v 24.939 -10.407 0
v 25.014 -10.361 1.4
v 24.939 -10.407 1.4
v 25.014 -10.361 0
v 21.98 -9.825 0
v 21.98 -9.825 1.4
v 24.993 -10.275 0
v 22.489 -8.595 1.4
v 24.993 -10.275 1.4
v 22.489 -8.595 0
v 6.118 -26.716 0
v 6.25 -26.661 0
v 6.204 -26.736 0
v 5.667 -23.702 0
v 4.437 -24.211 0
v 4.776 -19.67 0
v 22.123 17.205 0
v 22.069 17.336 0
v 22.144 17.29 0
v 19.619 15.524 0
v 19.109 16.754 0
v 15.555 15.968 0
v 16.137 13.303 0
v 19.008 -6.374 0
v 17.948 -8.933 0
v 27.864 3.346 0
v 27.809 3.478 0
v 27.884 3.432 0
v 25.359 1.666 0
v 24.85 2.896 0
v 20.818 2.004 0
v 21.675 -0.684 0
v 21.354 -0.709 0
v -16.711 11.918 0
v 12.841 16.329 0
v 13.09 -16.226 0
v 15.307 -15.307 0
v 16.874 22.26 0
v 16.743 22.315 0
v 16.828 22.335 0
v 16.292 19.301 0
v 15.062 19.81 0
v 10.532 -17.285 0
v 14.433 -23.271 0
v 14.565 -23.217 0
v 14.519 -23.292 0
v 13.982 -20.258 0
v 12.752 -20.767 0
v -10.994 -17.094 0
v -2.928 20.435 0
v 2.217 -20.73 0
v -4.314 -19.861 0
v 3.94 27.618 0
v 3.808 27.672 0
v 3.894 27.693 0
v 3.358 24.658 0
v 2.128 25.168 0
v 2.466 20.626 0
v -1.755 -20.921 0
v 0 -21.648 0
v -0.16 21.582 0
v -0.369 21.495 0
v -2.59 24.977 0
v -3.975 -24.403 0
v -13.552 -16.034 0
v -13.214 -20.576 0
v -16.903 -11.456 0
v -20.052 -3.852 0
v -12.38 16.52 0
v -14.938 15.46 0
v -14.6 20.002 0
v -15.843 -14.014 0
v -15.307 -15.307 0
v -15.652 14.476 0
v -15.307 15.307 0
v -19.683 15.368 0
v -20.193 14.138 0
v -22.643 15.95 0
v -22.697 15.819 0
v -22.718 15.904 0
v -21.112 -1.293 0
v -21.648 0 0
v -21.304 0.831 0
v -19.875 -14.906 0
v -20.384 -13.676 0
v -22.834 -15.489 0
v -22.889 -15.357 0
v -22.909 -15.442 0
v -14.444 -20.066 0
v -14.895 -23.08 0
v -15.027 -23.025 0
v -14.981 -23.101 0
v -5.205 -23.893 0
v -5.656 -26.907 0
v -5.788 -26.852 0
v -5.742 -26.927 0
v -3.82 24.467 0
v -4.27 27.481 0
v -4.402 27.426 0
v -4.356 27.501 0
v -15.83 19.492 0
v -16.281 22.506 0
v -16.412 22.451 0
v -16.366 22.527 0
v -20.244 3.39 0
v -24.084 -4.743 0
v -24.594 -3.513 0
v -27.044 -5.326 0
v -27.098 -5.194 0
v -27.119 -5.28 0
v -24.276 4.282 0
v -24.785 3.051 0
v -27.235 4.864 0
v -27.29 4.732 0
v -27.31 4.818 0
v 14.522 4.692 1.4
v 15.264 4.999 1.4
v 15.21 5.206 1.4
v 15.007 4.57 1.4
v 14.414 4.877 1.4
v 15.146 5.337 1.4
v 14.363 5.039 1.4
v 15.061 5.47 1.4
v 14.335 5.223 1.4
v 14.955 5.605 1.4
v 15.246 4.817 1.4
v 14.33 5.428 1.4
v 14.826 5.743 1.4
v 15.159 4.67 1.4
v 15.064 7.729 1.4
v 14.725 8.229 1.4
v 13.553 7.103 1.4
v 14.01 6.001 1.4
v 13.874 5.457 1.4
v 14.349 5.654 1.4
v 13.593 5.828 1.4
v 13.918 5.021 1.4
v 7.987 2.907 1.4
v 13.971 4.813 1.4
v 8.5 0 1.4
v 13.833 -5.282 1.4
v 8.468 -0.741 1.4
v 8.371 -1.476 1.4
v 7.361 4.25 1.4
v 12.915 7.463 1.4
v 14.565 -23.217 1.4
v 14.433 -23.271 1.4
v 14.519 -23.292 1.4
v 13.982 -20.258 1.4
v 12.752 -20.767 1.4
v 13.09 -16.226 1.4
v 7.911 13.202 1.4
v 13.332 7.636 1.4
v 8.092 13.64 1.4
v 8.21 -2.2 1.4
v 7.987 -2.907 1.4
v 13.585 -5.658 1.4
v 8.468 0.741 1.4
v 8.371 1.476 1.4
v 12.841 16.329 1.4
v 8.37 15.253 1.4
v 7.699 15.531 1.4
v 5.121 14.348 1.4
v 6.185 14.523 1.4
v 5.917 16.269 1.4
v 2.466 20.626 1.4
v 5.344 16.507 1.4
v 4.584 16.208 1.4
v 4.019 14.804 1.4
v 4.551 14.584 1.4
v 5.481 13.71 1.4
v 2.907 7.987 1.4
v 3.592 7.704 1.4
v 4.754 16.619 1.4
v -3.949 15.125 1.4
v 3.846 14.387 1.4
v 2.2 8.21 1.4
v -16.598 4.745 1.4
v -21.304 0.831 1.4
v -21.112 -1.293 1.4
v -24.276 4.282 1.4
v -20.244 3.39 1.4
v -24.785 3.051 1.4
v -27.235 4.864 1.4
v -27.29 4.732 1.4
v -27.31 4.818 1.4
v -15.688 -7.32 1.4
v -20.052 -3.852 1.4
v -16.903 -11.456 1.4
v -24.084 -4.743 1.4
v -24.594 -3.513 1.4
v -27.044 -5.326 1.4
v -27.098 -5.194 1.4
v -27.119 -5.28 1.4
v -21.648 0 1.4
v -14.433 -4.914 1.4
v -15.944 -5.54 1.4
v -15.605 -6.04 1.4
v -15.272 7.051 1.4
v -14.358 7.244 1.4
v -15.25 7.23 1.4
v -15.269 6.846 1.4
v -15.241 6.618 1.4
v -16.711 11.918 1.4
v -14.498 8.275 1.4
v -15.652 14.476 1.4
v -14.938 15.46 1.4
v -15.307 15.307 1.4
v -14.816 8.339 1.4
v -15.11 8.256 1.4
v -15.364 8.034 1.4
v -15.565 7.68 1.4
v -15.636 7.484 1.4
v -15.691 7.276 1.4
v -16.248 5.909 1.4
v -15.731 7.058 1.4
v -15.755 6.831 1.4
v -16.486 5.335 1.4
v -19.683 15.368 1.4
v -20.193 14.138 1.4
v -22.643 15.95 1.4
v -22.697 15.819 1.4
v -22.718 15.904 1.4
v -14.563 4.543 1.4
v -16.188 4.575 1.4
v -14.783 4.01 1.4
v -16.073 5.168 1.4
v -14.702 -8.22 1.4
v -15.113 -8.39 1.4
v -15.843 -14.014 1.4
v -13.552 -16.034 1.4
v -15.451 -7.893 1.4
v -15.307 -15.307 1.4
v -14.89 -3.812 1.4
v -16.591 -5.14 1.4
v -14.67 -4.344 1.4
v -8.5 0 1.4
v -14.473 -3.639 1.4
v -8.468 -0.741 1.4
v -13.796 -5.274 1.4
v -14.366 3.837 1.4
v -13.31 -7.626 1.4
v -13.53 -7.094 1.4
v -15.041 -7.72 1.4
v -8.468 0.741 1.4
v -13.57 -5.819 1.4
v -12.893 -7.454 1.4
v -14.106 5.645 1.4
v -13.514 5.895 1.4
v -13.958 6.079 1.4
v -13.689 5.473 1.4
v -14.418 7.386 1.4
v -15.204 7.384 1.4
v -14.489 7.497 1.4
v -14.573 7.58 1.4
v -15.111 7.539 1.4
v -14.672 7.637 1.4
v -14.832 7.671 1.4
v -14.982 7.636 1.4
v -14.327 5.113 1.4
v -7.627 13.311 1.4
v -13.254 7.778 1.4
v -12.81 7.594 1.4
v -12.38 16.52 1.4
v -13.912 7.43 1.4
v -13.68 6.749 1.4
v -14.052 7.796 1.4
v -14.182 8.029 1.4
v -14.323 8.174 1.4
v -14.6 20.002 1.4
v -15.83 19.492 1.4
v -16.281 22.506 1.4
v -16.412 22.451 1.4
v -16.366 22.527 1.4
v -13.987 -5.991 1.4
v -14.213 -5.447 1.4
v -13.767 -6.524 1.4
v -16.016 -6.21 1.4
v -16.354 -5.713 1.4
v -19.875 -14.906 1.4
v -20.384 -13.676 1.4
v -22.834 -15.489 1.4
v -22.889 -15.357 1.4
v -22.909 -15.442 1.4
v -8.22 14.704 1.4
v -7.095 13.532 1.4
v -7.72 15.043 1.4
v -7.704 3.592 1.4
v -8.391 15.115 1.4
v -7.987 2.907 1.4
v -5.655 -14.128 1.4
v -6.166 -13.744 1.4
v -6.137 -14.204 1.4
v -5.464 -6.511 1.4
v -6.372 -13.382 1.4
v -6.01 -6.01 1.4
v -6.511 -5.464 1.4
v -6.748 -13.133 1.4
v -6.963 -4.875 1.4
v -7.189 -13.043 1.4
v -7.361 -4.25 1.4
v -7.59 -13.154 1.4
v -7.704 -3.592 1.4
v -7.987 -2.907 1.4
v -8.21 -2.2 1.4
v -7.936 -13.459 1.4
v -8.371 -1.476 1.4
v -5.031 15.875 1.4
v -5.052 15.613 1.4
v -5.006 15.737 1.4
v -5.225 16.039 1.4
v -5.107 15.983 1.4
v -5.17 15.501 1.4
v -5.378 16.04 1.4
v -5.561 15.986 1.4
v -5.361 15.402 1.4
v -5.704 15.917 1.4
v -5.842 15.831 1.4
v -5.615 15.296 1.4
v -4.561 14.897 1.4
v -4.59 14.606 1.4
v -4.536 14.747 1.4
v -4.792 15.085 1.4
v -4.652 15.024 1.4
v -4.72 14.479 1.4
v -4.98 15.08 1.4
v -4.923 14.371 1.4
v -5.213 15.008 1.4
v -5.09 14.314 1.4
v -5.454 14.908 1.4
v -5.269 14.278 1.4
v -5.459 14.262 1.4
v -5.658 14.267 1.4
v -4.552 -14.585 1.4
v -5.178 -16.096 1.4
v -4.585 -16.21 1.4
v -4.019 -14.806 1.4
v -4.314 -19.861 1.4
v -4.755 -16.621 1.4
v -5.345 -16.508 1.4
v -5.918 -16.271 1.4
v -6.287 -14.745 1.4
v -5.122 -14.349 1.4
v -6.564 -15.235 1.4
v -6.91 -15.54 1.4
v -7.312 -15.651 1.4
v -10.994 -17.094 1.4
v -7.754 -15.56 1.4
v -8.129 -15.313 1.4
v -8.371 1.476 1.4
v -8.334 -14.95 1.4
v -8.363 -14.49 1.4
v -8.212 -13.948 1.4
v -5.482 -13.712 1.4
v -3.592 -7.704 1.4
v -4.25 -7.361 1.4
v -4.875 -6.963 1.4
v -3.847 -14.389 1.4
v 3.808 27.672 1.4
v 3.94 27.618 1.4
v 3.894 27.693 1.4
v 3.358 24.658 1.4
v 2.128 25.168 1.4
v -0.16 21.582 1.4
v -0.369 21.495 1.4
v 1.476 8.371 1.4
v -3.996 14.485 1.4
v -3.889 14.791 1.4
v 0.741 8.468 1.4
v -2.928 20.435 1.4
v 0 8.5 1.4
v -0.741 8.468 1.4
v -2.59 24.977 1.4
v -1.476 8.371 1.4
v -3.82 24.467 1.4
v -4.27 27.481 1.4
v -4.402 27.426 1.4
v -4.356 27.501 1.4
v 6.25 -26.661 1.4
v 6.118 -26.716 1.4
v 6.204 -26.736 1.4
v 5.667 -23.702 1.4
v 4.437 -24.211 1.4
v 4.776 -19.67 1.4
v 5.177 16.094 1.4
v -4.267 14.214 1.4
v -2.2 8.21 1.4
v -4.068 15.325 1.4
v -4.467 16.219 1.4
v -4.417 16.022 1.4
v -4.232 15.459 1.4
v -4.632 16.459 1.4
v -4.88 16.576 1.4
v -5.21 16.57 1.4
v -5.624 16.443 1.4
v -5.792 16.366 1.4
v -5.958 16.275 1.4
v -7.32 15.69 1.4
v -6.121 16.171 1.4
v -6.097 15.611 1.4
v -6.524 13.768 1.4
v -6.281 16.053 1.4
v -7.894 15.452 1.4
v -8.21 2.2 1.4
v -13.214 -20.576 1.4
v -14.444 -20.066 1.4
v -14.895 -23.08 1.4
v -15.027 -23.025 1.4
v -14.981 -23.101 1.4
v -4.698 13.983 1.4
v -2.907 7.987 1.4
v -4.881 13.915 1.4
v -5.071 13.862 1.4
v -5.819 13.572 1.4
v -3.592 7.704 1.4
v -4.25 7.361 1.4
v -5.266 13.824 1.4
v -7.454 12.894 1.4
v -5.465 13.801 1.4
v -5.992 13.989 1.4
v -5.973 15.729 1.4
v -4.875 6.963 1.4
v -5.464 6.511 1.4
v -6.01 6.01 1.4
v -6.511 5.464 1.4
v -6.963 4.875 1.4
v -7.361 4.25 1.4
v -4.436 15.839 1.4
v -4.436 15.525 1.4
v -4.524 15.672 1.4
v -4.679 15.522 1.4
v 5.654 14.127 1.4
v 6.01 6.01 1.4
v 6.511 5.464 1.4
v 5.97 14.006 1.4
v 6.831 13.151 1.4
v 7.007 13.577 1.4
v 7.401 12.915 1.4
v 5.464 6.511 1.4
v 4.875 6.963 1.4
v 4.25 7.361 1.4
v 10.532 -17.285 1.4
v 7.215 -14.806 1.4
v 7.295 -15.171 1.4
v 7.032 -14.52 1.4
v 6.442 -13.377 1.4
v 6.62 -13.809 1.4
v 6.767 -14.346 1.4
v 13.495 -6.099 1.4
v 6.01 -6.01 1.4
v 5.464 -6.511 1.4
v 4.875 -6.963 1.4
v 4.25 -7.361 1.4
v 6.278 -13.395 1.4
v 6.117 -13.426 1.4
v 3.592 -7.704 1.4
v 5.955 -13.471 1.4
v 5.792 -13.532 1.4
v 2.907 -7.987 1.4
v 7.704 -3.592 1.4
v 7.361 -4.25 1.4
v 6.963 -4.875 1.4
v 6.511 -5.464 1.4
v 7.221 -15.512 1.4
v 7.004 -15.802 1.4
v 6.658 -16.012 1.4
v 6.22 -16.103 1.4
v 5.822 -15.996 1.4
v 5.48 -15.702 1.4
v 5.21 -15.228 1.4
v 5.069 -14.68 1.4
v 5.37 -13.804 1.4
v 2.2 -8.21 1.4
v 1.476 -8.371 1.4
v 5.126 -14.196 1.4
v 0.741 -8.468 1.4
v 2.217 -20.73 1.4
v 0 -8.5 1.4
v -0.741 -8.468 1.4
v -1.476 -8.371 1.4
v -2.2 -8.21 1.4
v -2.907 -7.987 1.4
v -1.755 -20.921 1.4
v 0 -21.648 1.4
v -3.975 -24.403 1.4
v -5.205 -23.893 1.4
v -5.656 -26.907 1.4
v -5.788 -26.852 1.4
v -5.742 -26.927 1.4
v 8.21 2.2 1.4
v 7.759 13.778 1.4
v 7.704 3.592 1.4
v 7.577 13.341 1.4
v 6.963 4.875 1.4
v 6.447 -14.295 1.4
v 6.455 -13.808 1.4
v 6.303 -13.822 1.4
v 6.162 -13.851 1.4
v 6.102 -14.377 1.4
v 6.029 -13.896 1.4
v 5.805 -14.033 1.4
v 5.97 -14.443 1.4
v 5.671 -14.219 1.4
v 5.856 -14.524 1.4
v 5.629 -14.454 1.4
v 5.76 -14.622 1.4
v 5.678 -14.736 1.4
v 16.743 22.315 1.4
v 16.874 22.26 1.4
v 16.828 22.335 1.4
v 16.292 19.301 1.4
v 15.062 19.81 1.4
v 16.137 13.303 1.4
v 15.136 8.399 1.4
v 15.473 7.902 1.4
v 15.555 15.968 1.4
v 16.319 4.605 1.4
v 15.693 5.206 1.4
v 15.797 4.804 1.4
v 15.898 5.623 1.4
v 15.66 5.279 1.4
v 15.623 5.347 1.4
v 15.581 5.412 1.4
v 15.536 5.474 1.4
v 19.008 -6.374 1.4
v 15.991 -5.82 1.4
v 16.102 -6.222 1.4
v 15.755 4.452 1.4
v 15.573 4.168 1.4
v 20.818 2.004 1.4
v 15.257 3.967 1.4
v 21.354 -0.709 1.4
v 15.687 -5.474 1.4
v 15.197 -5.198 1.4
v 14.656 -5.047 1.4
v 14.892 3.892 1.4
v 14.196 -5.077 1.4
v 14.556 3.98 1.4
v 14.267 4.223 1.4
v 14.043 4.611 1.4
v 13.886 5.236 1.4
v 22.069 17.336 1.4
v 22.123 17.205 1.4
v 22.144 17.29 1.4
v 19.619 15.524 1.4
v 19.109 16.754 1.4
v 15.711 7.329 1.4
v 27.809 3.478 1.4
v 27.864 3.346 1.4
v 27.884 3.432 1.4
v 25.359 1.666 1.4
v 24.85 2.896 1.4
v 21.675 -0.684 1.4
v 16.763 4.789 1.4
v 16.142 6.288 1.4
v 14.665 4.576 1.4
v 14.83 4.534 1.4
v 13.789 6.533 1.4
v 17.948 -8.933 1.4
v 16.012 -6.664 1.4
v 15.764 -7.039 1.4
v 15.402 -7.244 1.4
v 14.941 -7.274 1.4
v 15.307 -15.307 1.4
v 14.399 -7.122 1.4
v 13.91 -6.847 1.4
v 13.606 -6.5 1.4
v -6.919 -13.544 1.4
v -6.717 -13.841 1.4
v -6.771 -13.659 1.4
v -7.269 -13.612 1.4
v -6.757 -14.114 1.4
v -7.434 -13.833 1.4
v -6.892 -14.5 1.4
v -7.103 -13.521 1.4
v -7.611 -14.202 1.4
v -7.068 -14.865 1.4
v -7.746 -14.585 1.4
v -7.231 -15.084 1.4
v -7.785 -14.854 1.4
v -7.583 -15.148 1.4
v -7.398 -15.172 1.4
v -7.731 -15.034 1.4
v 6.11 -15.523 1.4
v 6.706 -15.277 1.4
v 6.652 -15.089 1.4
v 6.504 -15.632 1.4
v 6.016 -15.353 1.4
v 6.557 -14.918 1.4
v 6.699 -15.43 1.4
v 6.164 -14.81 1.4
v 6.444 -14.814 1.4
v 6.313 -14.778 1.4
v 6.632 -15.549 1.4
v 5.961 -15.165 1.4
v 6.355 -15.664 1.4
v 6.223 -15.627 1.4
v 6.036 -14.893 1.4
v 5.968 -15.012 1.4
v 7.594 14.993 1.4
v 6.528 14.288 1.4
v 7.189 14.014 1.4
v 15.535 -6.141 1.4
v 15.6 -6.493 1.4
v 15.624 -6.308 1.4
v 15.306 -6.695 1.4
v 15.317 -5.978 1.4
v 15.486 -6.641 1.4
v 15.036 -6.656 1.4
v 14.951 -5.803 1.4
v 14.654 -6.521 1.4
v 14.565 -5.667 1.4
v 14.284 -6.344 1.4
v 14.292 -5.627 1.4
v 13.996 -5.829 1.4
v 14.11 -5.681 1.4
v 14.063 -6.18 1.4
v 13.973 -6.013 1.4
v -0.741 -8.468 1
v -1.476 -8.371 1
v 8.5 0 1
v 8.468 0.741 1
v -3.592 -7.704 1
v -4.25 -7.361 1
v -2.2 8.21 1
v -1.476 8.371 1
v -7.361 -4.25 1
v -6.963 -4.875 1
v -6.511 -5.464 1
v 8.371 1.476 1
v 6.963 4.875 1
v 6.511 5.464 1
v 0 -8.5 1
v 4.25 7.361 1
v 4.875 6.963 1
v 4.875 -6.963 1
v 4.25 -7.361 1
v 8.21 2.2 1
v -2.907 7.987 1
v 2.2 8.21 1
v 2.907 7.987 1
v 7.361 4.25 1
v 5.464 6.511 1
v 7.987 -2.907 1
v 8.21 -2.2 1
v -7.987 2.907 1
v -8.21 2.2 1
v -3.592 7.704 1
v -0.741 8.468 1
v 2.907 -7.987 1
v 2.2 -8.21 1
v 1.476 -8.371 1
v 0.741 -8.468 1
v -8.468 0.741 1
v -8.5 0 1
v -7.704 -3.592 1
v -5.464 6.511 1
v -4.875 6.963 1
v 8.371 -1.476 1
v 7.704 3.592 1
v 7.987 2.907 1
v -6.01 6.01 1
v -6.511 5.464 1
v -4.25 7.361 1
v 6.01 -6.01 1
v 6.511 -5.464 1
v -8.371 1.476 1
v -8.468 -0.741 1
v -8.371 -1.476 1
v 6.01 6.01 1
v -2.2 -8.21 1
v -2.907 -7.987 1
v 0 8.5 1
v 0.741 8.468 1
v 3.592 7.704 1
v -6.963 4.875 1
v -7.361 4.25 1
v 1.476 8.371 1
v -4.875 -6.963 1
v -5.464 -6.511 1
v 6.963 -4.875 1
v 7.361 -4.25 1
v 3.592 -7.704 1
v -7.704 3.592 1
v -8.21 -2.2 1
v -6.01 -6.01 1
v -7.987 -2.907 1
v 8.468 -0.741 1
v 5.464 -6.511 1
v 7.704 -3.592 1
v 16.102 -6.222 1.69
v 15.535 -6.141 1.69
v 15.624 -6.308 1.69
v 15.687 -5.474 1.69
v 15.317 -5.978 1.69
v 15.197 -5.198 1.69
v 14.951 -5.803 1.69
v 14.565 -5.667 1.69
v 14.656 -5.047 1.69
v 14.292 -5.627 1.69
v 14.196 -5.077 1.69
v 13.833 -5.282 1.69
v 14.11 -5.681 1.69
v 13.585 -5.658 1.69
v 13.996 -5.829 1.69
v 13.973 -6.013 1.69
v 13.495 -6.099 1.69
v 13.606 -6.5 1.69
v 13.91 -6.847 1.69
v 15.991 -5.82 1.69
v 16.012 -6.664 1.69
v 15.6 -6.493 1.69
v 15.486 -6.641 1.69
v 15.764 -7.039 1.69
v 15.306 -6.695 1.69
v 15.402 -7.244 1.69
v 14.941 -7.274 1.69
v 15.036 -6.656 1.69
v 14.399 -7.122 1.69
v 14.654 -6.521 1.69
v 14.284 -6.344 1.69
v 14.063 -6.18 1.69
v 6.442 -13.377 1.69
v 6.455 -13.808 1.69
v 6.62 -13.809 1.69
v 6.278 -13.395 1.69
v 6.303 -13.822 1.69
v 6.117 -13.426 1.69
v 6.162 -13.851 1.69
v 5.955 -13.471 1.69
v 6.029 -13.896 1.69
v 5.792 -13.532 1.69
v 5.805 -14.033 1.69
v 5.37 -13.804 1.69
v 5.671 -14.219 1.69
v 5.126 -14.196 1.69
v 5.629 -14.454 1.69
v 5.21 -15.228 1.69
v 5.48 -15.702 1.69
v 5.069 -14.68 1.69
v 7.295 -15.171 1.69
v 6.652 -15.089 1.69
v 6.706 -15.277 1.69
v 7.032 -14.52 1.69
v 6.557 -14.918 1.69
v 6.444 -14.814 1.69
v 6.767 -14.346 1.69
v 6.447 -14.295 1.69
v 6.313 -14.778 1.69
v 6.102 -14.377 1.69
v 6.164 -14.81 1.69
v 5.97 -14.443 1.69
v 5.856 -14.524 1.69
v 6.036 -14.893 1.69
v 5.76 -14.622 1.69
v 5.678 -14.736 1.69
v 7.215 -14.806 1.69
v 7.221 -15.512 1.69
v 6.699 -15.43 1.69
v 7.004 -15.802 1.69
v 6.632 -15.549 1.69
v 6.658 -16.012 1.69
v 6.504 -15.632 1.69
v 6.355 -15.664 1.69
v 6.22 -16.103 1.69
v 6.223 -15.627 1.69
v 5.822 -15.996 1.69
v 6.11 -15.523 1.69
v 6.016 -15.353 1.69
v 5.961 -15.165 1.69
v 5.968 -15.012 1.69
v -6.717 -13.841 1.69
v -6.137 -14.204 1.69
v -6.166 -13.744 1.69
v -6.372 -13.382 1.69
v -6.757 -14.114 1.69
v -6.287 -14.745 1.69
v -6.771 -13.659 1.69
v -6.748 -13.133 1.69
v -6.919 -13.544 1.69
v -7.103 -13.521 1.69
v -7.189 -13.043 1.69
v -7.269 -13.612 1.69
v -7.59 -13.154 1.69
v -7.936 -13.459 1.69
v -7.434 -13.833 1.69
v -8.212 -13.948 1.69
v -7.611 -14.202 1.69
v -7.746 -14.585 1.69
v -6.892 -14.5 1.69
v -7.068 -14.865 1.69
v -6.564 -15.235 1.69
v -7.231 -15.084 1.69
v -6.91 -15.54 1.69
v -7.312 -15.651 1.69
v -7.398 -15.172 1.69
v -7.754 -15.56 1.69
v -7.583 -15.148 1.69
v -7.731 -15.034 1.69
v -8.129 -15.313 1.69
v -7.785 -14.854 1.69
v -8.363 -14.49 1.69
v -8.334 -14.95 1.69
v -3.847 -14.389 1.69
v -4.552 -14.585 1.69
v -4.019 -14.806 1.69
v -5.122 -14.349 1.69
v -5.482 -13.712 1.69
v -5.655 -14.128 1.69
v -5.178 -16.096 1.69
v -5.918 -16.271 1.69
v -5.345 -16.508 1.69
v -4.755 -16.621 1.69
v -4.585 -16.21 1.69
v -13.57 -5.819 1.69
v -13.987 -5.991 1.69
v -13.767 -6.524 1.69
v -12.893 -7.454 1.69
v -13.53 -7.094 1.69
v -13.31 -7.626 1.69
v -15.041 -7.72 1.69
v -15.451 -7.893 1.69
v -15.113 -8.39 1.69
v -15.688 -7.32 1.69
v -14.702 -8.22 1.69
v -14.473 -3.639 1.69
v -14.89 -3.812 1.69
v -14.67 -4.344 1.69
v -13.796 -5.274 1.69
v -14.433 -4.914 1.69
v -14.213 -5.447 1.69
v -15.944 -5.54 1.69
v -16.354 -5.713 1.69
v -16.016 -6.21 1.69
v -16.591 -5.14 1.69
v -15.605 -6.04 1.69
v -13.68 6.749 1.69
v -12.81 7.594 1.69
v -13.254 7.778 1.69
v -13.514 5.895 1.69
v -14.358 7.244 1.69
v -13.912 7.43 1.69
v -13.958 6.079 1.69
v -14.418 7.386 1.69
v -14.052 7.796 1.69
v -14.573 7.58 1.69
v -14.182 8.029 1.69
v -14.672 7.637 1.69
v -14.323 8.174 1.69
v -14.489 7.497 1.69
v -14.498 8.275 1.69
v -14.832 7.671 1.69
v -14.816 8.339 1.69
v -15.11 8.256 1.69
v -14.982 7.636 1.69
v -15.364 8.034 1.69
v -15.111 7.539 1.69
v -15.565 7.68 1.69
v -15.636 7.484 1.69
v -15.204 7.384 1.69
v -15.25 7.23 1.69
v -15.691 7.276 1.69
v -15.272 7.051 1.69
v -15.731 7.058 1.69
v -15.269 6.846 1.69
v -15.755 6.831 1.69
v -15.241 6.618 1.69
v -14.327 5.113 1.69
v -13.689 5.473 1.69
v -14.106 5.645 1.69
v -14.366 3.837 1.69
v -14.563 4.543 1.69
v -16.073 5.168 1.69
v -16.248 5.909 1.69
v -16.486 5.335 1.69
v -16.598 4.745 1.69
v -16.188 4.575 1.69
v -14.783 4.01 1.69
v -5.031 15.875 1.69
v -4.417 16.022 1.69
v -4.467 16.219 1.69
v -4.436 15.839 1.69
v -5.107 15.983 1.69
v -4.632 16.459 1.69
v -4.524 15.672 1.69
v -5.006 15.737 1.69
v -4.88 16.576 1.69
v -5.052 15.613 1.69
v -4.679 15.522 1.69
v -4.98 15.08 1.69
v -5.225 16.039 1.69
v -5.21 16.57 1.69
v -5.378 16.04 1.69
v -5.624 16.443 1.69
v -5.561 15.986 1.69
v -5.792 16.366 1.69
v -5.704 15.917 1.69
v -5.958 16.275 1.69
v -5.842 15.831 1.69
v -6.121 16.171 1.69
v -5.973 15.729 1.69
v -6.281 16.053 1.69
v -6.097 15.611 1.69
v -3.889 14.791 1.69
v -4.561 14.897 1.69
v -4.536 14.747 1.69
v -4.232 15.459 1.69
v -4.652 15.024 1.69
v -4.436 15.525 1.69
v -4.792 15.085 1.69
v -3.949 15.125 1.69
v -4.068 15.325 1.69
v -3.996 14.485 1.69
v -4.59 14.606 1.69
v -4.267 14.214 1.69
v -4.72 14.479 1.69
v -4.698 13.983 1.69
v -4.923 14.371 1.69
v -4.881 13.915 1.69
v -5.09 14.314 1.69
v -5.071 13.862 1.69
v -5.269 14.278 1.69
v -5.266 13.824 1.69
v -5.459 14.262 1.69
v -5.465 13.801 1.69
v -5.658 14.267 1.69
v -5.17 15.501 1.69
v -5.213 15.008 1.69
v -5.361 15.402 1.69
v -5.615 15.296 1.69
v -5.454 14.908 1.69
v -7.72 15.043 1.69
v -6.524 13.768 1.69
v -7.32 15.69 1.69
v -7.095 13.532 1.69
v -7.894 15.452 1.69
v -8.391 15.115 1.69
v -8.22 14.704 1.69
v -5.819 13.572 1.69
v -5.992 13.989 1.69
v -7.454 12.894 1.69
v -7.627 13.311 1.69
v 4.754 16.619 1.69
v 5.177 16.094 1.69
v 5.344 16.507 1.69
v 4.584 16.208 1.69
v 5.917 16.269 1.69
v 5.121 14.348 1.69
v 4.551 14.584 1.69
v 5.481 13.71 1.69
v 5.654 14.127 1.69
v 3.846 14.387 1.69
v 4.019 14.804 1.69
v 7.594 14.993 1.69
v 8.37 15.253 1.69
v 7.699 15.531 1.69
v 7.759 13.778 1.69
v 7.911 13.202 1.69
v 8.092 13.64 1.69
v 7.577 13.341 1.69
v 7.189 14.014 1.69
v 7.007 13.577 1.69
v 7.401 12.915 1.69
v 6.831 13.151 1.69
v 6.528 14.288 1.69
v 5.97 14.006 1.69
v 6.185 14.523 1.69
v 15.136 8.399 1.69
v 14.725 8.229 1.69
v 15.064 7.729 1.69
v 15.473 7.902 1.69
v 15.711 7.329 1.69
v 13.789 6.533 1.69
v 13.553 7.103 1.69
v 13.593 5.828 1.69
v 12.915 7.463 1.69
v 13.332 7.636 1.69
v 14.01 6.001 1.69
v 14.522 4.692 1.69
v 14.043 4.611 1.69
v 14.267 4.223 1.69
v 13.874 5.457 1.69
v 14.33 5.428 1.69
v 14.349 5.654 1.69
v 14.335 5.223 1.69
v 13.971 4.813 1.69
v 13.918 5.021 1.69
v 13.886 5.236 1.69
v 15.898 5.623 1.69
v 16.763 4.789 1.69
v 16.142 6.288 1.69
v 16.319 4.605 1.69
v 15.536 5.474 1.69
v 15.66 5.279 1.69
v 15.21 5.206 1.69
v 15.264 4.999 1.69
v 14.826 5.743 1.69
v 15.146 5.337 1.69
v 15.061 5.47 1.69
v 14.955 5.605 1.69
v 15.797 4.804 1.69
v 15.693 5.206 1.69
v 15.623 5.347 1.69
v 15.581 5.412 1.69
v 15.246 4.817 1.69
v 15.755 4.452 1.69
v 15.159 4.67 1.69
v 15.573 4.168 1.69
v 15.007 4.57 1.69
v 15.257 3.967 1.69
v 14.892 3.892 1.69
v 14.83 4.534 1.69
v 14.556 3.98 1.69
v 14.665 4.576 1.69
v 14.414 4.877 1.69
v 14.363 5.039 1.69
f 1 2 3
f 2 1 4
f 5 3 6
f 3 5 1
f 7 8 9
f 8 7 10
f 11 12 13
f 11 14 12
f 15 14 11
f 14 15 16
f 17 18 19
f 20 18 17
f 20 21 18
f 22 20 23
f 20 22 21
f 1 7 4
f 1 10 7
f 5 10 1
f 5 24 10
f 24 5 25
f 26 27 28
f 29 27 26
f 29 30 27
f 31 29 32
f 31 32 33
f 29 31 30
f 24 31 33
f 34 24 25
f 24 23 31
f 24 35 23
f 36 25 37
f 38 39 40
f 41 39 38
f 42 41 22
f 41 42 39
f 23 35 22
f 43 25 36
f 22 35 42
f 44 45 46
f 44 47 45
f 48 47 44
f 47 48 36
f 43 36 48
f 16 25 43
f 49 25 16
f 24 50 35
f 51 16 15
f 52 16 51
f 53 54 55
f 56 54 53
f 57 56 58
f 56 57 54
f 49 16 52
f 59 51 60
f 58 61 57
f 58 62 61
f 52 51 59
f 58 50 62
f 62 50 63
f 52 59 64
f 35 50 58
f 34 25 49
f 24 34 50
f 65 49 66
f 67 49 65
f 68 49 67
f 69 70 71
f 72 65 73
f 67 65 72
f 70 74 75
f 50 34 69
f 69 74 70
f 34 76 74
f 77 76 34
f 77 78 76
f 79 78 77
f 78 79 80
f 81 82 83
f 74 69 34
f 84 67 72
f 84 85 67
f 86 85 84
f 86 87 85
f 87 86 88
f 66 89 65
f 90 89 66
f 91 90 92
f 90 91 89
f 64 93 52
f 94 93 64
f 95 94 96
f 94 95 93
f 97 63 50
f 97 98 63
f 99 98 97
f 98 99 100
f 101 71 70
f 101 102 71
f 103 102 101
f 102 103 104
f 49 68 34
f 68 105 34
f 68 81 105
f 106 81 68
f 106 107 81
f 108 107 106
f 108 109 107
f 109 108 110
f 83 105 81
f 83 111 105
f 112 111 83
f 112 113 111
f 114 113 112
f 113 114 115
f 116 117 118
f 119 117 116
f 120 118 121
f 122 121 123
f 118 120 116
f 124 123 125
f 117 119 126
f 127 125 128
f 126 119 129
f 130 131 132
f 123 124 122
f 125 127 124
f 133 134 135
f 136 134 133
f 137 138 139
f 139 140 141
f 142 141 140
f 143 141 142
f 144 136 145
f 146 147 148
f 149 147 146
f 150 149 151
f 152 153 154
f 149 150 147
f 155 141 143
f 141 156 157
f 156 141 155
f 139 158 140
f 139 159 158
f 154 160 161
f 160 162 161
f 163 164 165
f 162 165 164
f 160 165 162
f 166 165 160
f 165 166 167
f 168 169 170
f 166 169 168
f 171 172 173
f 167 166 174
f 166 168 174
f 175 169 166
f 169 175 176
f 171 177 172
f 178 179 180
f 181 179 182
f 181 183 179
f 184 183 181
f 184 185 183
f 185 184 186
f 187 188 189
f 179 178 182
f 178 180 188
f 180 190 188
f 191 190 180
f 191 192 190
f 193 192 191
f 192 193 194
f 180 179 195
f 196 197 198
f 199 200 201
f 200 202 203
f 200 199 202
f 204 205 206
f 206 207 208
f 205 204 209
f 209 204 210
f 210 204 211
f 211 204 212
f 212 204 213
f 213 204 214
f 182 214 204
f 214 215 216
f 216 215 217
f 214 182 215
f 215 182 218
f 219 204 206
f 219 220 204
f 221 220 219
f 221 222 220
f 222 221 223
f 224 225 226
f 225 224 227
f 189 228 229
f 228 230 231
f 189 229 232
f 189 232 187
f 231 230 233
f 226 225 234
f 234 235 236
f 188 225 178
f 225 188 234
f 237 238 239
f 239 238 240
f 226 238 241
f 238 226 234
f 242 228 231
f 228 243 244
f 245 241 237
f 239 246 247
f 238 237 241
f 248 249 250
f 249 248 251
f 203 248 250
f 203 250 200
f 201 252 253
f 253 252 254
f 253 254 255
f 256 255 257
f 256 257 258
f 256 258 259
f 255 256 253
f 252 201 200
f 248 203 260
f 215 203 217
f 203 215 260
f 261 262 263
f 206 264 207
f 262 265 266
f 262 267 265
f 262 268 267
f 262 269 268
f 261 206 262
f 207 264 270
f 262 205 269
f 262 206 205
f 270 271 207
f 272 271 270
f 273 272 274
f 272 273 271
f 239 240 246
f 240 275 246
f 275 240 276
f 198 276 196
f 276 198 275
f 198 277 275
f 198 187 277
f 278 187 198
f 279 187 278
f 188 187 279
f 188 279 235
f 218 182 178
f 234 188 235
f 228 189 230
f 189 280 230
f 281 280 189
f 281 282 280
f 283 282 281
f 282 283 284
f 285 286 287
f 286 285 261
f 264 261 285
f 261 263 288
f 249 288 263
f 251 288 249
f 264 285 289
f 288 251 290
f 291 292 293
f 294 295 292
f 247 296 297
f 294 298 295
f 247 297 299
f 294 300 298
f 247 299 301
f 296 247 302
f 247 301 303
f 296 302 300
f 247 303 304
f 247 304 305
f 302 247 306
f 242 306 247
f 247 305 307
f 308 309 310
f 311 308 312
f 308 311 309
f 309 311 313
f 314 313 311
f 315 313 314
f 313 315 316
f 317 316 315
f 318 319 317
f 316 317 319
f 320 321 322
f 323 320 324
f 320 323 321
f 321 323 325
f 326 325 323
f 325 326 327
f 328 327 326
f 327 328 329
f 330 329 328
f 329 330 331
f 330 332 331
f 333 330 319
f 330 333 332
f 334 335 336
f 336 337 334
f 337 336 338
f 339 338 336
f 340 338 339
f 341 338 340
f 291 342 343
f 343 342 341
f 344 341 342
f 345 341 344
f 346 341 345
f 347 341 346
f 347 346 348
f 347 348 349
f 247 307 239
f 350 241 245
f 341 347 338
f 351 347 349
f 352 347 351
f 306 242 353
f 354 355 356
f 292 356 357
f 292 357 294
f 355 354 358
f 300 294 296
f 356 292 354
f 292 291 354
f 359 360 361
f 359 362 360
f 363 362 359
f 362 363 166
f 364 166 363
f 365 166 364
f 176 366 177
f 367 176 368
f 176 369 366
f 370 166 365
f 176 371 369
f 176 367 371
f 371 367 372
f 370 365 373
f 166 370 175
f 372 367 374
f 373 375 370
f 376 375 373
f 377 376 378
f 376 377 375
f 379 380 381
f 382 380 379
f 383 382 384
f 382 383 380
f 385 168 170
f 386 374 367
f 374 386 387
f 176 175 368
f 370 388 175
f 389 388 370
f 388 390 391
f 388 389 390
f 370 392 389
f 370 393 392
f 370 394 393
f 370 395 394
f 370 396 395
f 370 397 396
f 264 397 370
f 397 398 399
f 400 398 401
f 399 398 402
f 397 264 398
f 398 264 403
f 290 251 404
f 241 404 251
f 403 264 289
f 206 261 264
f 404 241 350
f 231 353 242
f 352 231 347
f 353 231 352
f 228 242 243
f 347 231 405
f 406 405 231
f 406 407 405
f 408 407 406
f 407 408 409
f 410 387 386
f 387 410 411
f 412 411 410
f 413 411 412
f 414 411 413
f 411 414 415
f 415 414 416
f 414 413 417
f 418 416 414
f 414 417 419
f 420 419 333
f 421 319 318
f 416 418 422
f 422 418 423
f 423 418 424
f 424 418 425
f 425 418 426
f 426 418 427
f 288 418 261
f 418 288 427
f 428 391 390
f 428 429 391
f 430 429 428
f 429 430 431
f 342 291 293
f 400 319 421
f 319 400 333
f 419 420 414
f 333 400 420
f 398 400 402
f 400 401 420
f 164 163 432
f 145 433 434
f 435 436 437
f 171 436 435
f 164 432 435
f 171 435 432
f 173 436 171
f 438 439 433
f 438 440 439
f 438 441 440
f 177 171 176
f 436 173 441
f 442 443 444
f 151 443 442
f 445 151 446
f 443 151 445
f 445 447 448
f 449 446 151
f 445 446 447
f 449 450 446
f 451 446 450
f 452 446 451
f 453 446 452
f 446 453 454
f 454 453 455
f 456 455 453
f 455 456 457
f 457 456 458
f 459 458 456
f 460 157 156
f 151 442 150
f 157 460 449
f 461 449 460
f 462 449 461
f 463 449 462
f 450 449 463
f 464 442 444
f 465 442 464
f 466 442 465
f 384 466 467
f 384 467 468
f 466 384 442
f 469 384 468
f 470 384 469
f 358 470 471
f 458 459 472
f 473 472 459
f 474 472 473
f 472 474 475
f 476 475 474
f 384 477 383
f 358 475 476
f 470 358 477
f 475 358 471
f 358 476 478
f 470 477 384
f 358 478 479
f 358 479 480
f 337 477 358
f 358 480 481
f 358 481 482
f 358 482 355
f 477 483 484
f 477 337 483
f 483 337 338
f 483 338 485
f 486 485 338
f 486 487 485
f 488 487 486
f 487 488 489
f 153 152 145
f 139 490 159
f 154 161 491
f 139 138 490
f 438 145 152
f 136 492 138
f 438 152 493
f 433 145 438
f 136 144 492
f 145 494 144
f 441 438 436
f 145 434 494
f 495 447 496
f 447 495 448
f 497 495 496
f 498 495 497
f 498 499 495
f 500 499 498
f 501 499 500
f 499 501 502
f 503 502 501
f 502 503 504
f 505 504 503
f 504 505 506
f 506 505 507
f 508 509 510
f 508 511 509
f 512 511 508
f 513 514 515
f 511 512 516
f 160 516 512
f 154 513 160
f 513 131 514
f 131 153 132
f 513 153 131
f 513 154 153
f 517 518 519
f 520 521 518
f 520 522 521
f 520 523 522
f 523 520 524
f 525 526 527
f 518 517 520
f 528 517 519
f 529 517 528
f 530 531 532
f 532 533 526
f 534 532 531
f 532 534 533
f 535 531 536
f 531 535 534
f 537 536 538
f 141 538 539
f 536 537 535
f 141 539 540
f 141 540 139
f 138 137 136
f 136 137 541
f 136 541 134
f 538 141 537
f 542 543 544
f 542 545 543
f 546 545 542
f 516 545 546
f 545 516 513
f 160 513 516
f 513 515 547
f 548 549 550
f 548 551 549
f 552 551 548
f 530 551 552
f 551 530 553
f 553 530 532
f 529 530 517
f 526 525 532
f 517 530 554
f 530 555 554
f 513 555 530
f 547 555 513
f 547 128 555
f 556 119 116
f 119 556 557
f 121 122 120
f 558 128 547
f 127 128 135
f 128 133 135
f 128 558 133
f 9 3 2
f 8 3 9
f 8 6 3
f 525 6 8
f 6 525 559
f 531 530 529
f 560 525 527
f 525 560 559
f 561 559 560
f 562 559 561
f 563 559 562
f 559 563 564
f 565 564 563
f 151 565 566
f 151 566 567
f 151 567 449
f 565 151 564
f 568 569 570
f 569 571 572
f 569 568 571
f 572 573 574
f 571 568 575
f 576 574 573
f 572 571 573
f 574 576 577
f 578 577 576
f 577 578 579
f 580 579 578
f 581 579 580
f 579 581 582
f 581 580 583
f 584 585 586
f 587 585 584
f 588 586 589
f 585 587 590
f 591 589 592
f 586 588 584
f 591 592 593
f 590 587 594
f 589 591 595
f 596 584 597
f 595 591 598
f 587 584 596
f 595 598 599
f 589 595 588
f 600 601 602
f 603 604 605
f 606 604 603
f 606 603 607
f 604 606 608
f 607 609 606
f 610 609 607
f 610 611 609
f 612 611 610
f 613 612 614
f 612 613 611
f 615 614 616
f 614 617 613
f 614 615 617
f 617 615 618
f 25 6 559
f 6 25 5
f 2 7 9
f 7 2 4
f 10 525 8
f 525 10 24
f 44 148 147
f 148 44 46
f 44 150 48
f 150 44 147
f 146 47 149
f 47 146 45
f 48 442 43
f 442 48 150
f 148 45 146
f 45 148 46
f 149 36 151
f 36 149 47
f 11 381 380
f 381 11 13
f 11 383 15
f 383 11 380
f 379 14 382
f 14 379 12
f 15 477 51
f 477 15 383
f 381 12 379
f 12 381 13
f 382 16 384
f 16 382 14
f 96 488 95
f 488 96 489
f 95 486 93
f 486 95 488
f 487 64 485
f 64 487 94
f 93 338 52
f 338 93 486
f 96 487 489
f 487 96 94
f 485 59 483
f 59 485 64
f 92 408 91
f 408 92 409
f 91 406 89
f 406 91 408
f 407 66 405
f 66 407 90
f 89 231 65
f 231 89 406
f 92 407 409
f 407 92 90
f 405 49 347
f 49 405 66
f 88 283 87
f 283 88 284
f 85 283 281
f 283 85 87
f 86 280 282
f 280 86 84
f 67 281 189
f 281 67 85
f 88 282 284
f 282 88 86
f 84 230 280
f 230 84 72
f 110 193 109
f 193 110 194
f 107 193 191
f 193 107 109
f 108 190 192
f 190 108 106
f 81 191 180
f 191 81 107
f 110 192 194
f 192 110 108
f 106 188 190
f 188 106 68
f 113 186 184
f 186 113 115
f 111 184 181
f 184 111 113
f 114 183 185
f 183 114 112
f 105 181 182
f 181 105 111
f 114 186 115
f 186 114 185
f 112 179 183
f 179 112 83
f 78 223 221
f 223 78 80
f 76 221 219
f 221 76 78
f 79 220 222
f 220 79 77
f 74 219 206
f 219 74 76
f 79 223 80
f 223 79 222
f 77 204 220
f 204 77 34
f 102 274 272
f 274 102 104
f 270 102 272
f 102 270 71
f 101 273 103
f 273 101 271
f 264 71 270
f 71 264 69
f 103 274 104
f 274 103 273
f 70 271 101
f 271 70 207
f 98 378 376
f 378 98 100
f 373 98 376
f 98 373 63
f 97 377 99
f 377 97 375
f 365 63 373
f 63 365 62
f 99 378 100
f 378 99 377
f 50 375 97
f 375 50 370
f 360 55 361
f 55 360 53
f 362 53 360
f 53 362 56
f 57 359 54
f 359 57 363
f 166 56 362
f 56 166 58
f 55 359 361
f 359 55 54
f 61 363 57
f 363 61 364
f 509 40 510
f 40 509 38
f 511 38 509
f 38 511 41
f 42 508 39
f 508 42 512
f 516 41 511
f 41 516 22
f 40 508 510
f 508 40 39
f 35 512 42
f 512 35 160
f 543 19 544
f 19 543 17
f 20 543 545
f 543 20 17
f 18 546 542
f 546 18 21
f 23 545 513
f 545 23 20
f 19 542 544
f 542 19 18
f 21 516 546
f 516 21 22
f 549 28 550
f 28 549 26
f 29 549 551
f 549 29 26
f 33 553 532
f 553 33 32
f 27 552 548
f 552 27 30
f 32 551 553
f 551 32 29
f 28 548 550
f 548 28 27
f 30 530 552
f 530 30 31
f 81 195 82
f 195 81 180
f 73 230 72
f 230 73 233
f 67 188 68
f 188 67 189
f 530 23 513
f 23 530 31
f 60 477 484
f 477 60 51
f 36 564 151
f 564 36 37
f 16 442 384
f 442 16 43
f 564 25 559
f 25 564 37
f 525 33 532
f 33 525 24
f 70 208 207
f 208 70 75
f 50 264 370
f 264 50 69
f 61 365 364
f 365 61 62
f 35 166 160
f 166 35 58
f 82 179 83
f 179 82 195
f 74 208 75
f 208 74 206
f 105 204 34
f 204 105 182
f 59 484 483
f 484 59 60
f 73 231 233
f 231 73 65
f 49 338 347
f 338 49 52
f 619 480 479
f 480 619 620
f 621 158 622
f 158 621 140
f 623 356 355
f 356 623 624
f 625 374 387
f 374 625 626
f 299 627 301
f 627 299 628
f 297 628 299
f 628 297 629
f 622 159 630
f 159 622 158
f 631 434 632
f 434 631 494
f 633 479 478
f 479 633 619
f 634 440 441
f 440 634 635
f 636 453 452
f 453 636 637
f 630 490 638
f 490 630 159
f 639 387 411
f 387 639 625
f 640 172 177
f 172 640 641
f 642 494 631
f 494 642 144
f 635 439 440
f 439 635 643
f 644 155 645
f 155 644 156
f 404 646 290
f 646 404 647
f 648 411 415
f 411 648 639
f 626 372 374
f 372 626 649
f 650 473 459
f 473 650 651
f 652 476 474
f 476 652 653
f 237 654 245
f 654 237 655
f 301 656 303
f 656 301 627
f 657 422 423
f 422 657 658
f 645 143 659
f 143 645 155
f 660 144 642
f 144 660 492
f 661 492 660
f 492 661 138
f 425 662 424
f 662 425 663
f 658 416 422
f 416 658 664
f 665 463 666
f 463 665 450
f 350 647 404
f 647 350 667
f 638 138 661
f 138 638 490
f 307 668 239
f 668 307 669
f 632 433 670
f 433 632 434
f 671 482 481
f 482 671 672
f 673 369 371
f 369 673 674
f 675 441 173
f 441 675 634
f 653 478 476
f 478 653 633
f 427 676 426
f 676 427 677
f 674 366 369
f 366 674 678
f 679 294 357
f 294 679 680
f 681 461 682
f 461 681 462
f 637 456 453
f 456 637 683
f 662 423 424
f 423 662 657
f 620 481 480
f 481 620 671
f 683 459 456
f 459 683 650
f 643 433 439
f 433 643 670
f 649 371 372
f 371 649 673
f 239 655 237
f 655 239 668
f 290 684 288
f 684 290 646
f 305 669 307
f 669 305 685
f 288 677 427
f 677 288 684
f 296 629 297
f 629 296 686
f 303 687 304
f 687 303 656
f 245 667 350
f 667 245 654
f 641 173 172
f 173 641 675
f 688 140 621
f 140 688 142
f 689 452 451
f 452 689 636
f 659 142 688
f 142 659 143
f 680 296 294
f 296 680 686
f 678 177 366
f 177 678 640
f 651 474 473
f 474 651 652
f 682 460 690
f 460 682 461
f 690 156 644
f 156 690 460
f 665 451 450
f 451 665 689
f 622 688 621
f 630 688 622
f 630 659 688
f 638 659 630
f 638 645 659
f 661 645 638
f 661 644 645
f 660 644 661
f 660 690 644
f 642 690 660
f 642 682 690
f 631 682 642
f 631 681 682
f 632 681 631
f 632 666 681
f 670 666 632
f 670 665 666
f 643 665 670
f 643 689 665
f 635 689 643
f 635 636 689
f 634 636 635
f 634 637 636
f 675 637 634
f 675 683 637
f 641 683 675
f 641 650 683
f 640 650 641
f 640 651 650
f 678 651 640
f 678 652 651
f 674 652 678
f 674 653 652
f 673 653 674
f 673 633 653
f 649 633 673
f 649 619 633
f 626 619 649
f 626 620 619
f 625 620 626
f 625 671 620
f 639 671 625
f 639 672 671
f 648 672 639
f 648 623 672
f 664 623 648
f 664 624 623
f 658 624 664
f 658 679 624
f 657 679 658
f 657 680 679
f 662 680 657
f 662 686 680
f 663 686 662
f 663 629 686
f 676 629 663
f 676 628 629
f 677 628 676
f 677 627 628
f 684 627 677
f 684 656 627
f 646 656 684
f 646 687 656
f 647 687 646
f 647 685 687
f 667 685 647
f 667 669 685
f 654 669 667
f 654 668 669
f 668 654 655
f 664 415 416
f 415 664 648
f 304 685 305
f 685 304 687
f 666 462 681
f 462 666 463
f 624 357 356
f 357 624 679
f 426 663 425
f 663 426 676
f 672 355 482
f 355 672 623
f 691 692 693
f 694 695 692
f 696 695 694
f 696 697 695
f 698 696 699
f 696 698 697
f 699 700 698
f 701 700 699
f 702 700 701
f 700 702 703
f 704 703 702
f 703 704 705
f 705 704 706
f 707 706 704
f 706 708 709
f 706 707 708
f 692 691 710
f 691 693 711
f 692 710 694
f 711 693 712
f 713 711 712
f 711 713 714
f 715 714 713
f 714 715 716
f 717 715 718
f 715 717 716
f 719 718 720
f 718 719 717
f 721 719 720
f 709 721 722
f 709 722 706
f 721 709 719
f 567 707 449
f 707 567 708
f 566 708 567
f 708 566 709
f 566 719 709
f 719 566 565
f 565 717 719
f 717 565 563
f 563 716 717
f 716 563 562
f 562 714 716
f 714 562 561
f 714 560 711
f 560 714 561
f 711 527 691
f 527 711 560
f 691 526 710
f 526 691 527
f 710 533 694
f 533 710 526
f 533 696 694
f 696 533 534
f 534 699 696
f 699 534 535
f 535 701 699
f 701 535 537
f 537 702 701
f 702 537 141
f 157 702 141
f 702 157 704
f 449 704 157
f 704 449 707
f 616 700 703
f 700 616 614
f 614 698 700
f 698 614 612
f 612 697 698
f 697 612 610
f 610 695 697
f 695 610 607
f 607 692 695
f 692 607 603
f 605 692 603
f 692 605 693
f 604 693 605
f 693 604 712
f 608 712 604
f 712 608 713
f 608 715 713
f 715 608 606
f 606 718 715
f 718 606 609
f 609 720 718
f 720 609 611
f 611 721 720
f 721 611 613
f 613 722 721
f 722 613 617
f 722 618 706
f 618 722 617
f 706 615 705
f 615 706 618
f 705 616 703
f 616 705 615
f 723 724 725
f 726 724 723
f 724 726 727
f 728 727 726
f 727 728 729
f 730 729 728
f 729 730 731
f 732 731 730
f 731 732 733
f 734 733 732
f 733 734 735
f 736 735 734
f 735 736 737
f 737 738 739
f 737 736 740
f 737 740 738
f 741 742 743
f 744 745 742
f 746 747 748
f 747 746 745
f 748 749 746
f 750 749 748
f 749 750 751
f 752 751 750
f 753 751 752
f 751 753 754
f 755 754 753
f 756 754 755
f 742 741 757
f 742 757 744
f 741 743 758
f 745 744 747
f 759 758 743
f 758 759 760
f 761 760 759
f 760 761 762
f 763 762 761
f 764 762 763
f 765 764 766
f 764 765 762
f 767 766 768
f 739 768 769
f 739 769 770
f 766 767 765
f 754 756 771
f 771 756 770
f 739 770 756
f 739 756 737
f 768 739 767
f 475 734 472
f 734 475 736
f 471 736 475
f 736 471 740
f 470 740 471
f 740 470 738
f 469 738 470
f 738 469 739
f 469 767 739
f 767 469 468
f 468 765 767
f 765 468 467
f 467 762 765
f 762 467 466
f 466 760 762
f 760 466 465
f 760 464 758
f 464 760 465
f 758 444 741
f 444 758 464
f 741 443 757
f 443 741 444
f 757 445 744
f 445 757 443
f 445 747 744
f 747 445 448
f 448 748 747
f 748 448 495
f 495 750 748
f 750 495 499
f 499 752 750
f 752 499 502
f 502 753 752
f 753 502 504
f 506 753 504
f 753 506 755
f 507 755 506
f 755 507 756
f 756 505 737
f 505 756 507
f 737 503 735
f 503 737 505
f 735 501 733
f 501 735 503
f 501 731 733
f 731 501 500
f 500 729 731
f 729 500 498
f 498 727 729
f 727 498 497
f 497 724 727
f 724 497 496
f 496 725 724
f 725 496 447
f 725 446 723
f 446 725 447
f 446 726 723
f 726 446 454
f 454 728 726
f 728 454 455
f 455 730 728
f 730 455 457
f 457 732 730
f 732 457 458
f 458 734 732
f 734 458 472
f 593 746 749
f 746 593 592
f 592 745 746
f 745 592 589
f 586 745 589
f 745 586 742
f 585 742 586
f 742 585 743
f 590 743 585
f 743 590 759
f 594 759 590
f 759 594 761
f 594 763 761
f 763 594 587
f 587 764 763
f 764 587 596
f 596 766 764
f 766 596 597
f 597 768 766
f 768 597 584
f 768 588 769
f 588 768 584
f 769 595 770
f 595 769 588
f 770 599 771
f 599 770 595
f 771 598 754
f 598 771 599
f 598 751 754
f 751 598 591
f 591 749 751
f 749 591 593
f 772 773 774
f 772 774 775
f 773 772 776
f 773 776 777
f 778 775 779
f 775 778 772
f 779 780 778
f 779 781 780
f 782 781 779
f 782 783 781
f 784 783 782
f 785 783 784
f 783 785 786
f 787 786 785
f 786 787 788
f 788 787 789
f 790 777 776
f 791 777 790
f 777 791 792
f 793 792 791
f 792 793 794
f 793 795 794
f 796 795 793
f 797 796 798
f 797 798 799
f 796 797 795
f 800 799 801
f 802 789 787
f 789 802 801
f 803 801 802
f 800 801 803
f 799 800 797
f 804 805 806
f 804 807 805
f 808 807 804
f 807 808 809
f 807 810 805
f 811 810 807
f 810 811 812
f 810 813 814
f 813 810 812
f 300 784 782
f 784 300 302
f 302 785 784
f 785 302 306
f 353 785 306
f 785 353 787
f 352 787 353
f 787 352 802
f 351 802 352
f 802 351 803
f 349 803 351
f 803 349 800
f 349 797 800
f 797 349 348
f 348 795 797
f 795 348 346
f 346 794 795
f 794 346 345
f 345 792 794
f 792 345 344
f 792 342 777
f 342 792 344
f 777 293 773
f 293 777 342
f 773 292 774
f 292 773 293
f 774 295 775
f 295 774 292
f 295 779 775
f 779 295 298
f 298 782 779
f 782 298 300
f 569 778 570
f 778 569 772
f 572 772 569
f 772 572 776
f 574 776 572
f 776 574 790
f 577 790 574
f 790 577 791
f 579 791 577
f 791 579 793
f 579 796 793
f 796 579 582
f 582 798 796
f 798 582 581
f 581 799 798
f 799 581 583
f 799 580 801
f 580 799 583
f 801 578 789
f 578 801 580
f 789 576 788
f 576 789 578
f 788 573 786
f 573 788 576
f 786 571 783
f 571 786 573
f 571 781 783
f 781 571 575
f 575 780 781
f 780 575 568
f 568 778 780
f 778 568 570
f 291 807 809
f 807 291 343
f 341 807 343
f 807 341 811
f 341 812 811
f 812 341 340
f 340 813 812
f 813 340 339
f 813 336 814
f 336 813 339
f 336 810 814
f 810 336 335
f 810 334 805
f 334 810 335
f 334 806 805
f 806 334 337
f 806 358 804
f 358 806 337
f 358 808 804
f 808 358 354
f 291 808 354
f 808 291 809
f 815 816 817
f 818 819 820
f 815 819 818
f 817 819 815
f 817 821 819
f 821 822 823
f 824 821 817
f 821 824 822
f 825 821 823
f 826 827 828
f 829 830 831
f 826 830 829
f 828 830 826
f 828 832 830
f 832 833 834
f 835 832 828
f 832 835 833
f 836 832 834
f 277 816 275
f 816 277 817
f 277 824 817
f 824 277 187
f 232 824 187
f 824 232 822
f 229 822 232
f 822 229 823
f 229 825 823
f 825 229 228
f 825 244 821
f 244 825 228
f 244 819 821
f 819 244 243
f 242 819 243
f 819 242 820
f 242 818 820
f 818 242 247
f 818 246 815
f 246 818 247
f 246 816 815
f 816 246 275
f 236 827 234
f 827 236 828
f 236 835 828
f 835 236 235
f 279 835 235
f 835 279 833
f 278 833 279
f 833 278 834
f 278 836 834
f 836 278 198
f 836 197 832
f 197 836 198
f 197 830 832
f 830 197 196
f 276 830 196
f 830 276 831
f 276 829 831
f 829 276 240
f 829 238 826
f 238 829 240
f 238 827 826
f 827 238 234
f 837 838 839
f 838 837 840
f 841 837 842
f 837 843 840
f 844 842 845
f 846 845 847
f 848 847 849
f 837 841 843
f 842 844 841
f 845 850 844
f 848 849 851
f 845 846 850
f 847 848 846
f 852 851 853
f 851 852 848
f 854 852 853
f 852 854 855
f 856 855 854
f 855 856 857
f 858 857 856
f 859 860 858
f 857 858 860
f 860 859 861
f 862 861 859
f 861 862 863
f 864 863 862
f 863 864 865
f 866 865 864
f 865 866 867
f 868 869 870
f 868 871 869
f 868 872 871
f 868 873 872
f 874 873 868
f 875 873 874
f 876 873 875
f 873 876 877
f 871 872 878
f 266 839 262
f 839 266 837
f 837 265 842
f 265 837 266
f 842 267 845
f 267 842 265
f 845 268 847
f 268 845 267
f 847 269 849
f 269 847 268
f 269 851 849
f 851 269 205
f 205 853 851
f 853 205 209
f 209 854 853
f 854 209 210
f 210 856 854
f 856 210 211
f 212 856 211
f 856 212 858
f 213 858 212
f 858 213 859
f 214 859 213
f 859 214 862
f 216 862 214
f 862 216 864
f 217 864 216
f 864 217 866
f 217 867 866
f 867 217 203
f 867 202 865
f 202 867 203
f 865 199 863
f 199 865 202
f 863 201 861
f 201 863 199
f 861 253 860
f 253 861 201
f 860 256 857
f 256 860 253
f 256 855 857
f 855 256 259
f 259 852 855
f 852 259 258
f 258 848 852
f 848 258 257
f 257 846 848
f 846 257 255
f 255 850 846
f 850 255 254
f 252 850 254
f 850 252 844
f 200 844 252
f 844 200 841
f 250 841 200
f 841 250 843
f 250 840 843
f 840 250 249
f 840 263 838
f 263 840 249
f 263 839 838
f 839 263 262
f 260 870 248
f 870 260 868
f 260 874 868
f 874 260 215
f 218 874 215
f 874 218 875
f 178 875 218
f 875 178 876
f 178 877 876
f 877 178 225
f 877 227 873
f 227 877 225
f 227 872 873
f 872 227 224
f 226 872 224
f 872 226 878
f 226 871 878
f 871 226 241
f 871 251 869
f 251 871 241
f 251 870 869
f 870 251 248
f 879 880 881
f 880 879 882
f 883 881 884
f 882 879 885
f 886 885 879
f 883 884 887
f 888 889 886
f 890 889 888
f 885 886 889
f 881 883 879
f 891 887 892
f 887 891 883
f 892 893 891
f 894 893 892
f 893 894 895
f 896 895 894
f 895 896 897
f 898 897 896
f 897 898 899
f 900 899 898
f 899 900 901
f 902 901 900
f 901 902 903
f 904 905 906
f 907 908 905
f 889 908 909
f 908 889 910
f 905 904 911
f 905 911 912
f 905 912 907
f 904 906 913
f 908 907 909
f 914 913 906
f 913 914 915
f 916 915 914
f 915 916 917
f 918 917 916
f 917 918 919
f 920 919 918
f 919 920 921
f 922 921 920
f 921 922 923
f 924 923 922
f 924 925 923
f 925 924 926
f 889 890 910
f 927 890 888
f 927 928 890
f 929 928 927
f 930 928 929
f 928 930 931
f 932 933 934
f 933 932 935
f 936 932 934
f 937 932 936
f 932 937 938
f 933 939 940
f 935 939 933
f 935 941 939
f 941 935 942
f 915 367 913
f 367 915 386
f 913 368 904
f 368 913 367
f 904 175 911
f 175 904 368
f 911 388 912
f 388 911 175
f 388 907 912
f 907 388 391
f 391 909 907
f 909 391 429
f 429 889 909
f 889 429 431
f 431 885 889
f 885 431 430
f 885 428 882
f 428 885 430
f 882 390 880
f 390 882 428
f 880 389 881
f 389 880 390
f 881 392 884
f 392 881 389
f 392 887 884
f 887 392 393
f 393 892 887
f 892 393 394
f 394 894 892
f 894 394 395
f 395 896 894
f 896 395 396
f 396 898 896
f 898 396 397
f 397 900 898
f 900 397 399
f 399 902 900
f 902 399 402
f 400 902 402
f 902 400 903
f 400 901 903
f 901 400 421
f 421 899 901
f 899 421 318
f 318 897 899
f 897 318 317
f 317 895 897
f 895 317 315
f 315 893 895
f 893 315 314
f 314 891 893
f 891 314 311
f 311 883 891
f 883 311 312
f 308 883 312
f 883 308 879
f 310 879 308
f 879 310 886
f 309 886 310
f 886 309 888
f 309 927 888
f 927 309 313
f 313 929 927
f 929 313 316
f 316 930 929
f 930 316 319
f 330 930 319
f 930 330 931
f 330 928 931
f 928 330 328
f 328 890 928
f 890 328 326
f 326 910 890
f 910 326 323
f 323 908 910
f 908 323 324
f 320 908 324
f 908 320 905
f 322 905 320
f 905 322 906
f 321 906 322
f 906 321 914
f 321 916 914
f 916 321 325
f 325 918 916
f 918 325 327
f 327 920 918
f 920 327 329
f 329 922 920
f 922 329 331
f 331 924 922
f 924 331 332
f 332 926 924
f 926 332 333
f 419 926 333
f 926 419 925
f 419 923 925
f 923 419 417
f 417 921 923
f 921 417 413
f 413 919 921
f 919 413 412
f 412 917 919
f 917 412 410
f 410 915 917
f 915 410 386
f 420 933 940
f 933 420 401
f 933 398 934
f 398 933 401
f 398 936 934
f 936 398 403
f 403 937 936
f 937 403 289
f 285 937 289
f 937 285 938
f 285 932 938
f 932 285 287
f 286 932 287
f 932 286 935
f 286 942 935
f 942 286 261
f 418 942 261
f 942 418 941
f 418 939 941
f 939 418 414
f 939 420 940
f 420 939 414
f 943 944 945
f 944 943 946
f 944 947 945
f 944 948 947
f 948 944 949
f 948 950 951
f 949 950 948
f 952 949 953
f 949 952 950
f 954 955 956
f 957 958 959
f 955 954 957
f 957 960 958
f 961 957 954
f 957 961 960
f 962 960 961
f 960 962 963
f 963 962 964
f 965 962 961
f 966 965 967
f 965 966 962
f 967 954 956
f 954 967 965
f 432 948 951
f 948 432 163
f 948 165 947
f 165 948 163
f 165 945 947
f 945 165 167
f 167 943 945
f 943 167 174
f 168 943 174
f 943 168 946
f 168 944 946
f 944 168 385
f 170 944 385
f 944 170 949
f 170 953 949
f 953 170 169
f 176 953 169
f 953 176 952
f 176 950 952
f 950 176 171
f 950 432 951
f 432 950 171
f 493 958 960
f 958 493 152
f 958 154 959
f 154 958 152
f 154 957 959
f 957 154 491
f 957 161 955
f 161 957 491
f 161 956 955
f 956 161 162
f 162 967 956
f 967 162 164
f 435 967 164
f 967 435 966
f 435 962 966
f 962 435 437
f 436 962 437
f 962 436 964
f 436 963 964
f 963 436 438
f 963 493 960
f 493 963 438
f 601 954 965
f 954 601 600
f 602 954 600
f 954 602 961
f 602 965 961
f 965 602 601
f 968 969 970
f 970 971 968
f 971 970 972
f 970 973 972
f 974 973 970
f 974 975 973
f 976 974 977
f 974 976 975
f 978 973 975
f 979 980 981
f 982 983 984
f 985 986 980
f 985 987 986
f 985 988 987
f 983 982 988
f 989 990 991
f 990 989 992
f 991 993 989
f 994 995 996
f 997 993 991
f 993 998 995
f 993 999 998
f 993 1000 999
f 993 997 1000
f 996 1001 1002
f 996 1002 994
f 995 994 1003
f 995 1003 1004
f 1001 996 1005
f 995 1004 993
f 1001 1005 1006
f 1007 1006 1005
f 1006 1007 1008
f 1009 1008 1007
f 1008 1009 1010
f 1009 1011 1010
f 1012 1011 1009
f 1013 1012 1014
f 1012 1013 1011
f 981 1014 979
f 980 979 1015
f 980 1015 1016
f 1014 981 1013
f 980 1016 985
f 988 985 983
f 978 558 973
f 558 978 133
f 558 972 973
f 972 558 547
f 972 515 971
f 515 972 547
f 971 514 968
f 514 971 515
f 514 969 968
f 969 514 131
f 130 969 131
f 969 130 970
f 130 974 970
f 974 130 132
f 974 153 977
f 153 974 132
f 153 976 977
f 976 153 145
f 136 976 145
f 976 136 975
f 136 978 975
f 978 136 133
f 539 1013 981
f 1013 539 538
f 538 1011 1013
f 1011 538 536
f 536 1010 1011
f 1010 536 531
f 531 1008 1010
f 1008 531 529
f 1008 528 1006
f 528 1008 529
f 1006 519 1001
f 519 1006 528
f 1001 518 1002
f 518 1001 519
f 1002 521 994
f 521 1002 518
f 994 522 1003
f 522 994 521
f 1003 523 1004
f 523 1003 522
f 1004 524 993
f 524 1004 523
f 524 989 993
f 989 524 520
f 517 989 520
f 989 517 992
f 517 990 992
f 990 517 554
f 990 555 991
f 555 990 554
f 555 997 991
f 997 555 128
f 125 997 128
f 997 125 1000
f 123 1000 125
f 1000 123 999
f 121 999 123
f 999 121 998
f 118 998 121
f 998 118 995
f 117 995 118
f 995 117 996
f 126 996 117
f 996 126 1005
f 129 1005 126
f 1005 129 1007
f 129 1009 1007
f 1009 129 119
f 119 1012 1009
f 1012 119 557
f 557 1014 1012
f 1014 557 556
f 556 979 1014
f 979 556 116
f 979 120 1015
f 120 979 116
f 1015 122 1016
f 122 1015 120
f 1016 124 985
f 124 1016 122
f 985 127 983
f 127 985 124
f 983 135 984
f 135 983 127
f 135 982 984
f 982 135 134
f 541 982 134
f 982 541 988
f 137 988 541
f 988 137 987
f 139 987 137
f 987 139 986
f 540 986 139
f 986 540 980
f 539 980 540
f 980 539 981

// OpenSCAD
// 2-Point Discrimination Wheel — parametric n-gon, clockwise order
distances_mm       = is_undef(distances_mm) ? [0,9,10,11,12,13,14,15] : distances_mm;
outer_flat_to_flat = is_undef(outer_flat_to_flat) ? 40 : outer_flat_to_flat;
base_thickness     = is_undef(base_thickness) ? 1.4 : base_thickness;
spike_length  = is_undef(spike_length) ? 7 : spike_length;
base_d        = is_undef(base_d) ? 3 : base_d;
shank_d       = is_undef(shank_d) ? 1.4 : shank_d;
tip_d         = is_undef(tip_d) ? 0.15 : tip_d;
root_overlap  = is_undef(root_overlap) ? .7 : root_overlap;
label_size    = is_undef(label_size) ? 2.5 : label_size;
label_depth   = is_undef(label_depth) ? .3 : label_depth;
font_name     = is_undef(font_name) ? "DejaVu Sans:style=Bold" : font_name;
label_radial  = is_undef(label_radial) ? 0.80 : label_radial;
hub_diameter  = is_undef(hub_diameter) ? 17 : hub_diameter;
thumb_depth   = is_undef(thumb_depth) ? 1.2 : thumb_depth;
chamfer = is_undef(chamfer) ? 0.8 : chamfer;
$fn = is_undef($fn) ? 72 : $fn;

module soft_chamfer(h=chamfer){
  if (h>0) minkowski(){ children(); cylinder(h=h,r1=h,r2=0,$fn=24); }
  else children();
}
function apothem(across_flats,n)=across_flats/2;
function circ_radius(across_flats,n)=across_flats/(2*cos(180/n));
function total_thickness()=base_thickness+max(chamfer,0);

module polygon_plate(n, across_flats, thk){
  r = circ_radius(across_flats,n);
  linear_extrude(thk)
    polygon(points=[for(i=[0:n-1]) let(a=360*i/n)[r*cos(a), r*sin(a)]]);
}


module spike_single_flat(len=spike_length,bd=base_d,sd=shank_d,td=tip_d){
  base_r=bd/2; shank_r=sd/2; tip_r=td/2;
  bx=-root_overlap; sx=len*0.55; tx=len;
  linear_extrude(height=base_thickness)
  union(){
    translate([bx,0]) circle(r=base_r);
    hull(){translate([bx,0])circle(r=base_r);translate([sx,0])circle(r=shank_r);}
    hull(){translate([sx,0])circle(r=shank_r);translate([tx,0])circle(r=tip_r);}
  }
}

module thumb_well_top(){
  translate([0,0,total_thickness()-thumb_depth])
    cylinder(h=thumb_depth,d=hub_diameter,$fn=72);
}

module edge_numbers_top(distances,a){
  n=len(distances);
  for(i=[0:n-1]){
    angN=-360*(i+0.5)/n;
    translate([(label_radial*a)*cos(angN),
               (label_radial*a)*sin(angN),
               base_thickness - 0.01])
      rotate([0,0,angN-90])
        linear_extrude(height=label_depth)
          text(str(distances[i]),
               size=label_size,font=font_name,
               halign="center",valign="center");
  }
}


module wheel_solid(distances){
  n=len(distances);
  a=apothem(outer_flat_to_flat,n);
  union(){
    polygon_plate(n,outer_flat_to_flat,base_thickness);
    for(i=[0:n-1]){
      angN=-360*(i+0.5)/n;
      translate([a*cos(angN),a*sin(angN),0])
        rotate([0,0,angN]){
          sep=distances[i];
          translate([0,+sep/2,0])spike_single_flat();
          translate([0,-sep/2,0])spike_single_flat();
        }
    }
  }
}

module discriminator(distances){
  n=len(distances);
  assert(n>=3,"distances_mm must have at least 3 entries.");

  union(){
    difference(){
      wheel_solid(distances);
      thumb_well_top();
    }
    edge_numbers_top(distances, apothem(outer_flat_to_flat,n));
  }
}
discriminator(distances_mm);
